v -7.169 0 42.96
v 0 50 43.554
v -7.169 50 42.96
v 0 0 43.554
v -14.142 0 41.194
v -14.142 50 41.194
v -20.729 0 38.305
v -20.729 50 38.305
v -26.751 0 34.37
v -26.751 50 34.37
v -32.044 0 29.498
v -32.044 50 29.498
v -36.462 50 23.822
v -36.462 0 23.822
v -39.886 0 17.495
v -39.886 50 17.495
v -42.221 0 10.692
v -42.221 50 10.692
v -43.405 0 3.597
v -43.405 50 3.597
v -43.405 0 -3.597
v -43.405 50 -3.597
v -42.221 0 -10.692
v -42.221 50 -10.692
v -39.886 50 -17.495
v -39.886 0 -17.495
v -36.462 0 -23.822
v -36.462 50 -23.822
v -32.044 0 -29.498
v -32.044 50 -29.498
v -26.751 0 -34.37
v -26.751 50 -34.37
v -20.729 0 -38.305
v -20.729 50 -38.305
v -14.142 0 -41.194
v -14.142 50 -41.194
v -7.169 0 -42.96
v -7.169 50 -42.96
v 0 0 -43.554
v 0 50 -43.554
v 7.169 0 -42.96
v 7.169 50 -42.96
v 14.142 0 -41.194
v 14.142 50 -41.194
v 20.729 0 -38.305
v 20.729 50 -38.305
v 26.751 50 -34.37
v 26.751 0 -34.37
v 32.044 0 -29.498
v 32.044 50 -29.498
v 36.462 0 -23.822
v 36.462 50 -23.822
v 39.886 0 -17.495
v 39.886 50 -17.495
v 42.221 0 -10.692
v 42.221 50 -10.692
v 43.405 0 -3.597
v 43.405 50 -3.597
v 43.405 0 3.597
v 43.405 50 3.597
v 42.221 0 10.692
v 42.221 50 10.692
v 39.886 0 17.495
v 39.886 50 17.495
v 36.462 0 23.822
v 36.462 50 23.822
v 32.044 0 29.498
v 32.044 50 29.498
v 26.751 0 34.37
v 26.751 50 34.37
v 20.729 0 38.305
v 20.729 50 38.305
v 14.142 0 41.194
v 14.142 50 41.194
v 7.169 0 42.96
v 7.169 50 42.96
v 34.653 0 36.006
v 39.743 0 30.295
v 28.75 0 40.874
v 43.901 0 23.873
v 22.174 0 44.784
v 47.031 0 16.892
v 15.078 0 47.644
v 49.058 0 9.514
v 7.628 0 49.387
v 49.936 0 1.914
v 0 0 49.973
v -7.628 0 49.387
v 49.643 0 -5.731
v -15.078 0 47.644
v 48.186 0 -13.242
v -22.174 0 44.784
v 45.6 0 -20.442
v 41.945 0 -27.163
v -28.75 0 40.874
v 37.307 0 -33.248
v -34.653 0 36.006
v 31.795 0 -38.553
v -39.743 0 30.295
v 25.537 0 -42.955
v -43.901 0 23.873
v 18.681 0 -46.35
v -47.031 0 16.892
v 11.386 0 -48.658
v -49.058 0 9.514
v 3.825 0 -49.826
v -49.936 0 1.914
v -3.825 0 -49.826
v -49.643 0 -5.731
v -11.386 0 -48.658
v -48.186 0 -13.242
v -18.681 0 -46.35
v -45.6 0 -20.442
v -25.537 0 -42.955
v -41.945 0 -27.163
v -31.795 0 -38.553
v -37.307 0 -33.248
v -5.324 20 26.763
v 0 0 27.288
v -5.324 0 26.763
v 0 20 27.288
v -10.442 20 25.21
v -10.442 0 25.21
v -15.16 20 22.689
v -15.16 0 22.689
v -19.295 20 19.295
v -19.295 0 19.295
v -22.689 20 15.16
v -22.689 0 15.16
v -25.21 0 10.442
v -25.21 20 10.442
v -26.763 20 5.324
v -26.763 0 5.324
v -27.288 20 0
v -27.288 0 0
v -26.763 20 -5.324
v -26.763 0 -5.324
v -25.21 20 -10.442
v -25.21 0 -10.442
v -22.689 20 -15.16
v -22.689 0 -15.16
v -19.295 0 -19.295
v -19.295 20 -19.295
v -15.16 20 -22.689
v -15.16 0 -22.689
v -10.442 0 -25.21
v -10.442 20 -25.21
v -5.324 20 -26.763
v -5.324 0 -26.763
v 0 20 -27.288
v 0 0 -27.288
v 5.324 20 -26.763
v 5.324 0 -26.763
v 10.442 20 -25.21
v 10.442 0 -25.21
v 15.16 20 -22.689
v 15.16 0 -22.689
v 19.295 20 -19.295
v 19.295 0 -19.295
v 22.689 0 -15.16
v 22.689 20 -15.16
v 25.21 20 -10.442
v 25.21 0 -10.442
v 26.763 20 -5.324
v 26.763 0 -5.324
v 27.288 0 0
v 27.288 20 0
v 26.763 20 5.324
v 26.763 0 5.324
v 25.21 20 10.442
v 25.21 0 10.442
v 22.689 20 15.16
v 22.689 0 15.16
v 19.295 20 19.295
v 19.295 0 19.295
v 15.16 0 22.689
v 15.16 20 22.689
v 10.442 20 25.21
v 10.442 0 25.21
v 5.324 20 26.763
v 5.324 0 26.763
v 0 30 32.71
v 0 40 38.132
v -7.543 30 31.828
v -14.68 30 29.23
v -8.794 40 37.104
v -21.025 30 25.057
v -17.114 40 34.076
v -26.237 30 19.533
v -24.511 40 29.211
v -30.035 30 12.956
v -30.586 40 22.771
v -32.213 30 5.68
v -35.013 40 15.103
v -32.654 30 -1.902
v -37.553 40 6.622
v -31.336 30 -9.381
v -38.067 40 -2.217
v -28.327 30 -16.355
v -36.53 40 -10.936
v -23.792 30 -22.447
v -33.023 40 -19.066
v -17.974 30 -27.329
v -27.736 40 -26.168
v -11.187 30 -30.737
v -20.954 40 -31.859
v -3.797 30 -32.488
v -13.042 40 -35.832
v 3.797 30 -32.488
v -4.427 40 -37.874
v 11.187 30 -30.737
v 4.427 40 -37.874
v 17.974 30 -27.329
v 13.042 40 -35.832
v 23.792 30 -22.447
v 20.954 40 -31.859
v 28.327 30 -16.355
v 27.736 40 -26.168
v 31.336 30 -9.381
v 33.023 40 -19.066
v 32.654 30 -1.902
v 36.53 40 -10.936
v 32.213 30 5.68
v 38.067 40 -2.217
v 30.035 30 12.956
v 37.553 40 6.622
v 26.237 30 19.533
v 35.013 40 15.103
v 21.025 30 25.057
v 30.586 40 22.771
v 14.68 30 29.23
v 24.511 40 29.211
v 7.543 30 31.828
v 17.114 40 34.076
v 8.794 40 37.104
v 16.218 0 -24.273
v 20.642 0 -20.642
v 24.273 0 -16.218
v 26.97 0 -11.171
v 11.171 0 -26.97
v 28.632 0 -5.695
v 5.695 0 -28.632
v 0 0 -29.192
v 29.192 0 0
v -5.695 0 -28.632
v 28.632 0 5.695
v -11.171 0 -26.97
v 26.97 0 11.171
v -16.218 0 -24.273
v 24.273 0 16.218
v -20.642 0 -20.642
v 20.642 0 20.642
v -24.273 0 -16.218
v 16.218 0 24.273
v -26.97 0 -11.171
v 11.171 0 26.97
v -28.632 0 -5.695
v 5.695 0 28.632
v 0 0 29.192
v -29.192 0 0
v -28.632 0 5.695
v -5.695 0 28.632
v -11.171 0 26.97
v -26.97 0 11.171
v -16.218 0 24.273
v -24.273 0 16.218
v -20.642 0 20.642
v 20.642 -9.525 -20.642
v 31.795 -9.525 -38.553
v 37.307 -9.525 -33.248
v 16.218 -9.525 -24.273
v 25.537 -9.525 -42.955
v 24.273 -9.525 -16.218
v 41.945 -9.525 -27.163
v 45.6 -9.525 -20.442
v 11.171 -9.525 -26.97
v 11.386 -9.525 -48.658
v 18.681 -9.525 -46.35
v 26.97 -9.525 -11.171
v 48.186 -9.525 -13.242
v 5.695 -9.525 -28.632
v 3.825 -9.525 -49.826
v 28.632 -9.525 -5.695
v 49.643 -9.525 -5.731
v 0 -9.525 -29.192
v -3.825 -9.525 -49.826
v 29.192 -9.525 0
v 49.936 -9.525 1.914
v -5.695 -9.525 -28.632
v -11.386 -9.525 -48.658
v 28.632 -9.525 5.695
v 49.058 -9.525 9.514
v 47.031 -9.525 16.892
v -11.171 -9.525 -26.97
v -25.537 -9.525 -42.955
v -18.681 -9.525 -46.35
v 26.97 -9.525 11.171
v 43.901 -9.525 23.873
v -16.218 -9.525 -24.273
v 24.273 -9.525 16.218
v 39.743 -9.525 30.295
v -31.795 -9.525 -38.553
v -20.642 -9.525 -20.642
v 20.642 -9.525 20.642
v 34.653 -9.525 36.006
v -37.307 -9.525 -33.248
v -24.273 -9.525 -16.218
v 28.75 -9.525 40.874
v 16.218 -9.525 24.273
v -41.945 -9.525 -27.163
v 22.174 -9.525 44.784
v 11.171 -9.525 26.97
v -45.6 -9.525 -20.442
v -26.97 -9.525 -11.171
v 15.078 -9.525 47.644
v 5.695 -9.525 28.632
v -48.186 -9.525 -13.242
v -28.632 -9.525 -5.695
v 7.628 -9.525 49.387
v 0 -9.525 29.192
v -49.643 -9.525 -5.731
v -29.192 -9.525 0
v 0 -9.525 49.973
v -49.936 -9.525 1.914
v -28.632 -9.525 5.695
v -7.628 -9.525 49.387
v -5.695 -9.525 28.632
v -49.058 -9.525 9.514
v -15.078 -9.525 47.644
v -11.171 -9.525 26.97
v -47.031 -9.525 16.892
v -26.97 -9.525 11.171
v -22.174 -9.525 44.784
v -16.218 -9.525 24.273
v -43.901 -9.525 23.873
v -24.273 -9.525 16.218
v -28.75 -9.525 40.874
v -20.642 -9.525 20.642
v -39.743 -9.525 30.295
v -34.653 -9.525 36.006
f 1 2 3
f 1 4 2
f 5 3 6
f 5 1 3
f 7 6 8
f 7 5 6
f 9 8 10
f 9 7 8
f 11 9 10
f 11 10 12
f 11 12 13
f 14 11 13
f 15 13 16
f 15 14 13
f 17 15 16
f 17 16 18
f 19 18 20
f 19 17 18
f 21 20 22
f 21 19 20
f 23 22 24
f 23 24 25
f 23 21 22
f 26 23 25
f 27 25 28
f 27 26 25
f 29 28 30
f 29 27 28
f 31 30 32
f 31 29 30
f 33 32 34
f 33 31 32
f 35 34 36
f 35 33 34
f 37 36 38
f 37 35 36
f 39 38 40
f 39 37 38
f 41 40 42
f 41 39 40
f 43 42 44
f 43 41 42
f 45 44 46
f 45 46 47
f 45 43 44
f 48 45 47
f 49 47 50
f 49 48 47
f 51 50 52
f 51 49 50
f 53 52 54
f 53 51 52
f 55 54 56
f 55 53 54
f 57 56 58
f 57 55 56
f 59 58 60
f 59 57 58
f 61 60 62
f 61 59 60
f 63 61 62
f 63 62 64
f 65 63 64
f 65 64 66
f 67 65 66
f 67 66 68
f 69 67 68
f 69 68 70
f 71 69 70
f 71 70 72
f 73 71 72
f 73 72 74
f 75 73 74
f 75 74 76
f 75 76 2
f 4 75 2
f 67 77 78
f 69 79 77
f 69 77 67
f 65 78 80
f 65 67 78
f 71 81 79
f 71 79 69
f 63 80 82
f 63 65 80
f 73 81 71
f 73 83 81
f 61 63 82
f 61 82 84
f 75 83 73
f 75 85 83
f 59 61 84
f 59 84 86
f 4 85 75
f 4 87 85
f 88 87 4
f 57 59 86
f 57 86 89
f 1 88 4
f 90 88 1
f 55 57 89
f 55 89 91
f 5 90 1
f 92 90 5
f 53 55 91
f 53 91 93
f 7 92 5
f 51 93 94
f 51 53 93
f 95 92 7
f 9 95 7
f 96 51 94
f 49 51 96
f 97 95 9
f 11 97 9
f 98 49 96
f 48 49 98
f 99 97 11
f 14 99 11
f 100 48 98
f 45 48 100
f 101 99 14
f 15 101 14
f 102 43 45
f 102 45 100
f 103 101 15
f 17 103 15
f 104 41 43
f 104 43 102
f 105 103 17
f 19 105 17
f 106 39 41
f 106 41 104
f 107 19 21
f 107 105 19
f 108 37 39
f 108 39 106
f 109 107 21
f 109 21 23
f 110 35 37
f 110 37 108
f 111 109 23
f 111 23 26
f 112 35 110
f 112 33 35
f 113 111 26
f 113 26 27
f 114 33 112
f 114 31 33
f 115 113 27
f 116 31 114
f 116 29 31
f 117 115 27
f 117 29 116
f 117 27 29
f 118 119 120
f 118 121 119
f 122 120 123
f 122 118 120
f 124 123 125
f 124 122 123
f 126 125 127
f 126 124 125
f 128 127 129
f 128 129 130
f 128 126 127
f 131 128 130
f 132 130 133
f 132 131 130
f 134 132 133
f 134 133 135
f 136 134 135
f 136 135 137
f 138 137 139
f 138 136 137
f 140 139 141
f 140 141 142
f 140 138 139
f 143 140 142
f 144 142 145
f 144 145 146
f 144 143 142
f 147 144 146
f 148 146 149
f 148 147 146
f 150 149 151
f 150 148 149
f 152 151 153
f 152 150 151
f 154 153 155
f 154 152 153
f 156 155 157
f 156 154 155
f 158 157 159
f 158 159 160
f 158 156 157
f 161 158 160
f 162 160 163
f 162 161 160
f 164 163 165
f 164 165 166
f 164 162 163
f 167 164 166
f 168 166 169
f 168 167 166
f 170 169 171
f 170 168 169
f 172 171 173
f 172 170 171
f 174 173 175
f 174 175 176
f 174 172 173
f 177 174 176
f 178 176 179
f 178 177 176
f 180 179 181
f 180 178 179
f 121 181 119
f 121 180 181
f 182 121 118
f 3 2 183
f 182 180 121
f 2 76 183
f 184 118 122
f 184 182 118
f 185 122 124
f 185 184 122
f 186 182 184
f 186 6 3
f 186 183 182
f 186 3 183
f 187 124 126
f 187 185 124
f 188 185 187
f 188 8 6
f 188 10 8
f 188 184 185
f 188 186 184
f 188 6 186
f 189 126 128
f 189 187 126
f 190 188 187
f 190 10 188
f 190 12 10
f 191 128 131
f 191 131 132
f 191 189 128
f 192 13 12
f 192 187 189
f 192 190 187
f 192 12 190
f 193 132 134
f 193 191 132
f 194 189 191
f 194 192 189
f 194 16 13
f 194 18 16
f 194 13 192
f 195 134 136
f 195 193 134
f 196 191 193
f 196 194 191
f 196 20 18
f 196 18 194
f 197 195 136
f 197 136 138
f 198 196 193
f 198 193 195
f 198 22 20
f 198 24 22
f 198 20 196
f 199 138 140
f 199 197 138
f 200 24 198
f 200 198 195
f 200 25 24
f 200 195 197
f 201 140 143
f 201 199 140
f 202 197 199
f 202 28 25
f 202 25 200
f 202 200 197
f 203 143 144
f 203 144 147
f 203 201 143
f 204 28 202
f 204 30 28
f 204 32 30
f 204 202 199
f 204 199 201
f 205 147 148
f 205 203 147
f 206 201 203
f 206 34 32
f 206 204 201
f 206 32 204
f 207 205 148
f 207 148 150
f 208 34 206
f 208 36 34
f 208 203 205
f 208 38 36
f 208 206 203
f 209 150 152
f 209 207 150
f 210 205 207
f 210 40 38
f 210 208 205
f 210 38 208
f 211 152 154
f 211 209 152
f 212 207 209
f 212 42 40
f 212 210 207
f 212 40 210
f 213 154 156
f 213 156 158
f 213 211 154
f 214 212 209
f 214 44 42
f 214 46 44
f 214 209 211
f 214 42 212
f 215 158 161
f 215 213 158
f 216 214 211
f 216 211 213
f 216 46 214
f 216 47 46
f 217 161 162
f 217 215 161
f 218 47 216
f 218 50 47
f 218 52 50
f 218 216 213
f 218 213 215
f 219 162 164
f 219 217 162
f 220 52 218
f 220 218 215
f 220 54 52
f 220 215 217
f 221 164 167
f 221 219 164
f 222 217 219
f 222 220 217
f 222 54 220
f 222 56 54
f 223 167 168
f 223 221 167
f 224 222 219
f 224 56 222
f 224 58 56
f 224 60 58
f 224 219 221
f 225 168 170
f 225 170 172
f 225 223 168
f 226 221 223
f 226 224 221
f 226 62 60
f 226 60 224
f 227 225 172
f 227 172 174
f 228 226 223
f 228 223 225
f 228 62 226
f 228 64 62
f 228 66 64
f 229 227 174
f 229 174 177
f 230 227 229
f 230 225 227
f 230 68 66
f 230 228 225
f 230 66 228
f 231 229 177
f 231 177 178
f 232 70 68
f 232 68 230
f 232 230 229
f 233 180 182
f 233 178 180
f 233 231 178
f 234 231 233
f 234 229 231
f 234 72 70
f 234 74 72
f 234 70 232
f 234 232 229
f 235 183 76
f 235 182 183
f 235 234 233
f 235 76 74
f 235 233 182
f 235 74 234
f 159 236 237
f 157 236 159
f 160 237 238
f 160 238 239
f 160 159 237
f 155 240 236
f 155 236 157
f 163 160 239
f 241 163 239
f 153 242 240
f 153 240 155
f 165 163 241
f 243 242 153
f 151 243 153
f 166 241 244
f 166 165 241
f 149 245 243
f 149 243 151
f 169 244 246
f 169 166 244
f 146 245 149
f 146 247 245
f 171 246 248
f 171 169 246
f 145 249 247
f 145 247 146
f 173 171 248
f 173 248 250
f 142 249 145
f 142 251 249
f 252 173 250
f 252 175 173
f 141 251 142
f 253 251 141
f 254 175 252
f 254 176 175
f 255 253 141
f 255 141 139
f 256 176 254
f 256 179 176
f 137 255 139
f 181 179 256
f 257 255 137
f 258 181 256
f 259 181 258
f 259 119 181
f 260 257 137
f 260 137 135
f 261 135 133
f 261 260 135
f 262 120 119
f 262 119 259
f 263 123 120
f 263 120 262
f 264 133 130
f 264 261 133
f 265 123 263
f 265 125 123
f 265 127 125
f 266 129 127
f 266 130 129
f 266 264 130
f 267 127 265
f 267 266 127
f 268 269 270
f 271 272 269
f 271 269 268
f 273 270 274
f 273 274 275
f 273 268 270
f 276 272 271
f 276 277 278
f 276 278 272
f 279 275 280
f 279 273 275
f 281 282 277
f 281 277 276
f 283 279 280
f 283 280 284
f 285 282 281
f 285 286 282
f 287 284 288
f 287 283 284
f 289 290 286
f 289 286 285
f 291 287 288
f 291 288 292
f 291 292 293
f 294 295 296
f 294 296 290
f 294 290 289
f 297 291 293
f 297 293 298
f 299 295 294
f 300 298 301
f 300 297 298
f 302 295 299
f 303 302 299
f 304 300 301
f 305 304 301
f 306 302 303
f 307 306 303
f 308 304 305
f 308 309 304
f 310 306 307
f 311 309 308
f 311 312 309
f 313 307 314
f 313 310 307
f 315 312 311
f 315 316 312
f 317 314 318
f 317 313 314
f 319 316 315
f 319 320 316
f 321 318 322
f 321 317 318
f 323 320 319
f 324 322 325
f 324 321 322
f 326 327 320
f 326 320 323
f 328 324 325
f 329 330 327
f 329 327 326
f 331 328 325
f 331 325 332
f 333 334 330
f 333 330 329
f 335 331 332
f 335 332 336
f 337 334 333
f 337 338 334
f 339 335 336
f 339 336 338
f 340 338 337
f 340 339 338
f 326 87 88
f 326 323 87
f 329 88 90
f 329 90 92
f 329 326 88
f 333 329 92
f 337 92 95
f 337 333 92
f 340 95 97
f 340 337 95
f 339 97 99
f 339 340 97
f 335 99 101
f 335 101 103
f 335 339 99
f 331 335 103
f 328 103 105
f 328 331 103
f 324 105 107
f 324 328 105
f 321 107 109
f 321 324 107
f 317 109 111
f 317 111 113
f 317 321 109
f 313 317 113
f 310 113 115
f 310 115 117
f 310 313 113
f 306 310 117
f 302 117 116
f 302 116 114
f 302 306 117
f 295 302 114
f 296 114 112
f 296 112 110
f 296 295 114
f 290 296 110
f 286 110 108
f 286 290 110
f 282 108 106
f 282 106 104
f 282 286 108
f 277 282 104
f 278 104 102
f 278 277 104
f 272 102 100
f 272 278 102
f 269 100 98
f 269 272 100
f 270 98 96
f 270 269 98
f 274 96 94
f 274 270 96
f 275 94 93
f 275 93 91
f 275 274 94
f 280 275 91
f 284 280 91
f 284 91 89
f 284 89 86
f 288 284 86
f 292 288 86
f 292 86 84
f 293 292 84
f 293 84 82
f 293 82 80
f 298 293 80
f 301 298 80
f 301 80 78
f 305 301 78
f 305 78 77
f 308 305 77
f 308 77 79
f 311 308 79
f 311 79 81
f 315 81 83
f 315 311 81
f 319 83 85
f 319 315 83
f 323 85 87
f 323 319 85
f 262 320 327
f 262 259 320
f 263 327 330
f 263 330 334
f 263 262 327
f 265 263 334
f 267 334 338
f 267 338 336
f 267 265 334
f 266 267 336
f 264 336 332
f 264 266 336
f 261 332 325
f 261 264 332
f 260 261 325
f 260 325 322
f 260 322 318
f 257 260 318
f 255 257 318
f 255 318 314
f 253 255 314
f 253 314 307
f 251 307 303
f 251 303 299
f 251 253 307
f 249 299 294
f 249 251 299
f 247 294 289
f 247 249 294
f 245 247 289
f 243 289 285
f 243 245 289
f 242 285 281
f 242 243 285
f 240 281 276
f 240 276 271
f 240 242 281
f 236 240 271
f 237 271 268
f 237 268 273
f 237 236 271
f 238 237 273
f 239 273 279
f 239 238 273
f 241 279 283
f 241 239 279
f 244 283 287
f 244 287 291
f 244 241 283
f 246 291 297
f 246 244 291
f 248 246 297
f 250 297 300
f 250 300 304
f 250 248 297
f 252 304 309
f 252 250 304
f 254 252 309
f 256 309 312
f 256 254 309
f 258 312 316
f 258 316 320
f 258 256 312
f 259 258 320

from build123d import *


with BuildPart() as part:
    # Sketch2 → Revolve1 (revolve)
    with BuildSketch(Plane(origin=(0, 0, 0), x_dir=(0, 1, 0), z_dir=(0, 0, 1)), mode=Mode.PRIVATE) as revolve1_sk:
        Polygon((0, 43.554), (0, 29.1925), (0, 27.2875), (20, 27.2875), (20, 43.554), align=None)
        Polygon((0, 49.972526435), (-9.525, 49.972526435), (-9.525, 29.1925), (0, 29.1925), (0, 43.554), align=None)
        Polygon((20, 27.2875), (50, 43.554), (20, 43.554), align=None)
    revolve(revolve1_sk.sketch.rotate(Axis((0, 52.97625, 0), (0, -1, 0)), 270), axis=Axis((0, 52.97625, 0), (0, -1, 0)))


solid = part.part
